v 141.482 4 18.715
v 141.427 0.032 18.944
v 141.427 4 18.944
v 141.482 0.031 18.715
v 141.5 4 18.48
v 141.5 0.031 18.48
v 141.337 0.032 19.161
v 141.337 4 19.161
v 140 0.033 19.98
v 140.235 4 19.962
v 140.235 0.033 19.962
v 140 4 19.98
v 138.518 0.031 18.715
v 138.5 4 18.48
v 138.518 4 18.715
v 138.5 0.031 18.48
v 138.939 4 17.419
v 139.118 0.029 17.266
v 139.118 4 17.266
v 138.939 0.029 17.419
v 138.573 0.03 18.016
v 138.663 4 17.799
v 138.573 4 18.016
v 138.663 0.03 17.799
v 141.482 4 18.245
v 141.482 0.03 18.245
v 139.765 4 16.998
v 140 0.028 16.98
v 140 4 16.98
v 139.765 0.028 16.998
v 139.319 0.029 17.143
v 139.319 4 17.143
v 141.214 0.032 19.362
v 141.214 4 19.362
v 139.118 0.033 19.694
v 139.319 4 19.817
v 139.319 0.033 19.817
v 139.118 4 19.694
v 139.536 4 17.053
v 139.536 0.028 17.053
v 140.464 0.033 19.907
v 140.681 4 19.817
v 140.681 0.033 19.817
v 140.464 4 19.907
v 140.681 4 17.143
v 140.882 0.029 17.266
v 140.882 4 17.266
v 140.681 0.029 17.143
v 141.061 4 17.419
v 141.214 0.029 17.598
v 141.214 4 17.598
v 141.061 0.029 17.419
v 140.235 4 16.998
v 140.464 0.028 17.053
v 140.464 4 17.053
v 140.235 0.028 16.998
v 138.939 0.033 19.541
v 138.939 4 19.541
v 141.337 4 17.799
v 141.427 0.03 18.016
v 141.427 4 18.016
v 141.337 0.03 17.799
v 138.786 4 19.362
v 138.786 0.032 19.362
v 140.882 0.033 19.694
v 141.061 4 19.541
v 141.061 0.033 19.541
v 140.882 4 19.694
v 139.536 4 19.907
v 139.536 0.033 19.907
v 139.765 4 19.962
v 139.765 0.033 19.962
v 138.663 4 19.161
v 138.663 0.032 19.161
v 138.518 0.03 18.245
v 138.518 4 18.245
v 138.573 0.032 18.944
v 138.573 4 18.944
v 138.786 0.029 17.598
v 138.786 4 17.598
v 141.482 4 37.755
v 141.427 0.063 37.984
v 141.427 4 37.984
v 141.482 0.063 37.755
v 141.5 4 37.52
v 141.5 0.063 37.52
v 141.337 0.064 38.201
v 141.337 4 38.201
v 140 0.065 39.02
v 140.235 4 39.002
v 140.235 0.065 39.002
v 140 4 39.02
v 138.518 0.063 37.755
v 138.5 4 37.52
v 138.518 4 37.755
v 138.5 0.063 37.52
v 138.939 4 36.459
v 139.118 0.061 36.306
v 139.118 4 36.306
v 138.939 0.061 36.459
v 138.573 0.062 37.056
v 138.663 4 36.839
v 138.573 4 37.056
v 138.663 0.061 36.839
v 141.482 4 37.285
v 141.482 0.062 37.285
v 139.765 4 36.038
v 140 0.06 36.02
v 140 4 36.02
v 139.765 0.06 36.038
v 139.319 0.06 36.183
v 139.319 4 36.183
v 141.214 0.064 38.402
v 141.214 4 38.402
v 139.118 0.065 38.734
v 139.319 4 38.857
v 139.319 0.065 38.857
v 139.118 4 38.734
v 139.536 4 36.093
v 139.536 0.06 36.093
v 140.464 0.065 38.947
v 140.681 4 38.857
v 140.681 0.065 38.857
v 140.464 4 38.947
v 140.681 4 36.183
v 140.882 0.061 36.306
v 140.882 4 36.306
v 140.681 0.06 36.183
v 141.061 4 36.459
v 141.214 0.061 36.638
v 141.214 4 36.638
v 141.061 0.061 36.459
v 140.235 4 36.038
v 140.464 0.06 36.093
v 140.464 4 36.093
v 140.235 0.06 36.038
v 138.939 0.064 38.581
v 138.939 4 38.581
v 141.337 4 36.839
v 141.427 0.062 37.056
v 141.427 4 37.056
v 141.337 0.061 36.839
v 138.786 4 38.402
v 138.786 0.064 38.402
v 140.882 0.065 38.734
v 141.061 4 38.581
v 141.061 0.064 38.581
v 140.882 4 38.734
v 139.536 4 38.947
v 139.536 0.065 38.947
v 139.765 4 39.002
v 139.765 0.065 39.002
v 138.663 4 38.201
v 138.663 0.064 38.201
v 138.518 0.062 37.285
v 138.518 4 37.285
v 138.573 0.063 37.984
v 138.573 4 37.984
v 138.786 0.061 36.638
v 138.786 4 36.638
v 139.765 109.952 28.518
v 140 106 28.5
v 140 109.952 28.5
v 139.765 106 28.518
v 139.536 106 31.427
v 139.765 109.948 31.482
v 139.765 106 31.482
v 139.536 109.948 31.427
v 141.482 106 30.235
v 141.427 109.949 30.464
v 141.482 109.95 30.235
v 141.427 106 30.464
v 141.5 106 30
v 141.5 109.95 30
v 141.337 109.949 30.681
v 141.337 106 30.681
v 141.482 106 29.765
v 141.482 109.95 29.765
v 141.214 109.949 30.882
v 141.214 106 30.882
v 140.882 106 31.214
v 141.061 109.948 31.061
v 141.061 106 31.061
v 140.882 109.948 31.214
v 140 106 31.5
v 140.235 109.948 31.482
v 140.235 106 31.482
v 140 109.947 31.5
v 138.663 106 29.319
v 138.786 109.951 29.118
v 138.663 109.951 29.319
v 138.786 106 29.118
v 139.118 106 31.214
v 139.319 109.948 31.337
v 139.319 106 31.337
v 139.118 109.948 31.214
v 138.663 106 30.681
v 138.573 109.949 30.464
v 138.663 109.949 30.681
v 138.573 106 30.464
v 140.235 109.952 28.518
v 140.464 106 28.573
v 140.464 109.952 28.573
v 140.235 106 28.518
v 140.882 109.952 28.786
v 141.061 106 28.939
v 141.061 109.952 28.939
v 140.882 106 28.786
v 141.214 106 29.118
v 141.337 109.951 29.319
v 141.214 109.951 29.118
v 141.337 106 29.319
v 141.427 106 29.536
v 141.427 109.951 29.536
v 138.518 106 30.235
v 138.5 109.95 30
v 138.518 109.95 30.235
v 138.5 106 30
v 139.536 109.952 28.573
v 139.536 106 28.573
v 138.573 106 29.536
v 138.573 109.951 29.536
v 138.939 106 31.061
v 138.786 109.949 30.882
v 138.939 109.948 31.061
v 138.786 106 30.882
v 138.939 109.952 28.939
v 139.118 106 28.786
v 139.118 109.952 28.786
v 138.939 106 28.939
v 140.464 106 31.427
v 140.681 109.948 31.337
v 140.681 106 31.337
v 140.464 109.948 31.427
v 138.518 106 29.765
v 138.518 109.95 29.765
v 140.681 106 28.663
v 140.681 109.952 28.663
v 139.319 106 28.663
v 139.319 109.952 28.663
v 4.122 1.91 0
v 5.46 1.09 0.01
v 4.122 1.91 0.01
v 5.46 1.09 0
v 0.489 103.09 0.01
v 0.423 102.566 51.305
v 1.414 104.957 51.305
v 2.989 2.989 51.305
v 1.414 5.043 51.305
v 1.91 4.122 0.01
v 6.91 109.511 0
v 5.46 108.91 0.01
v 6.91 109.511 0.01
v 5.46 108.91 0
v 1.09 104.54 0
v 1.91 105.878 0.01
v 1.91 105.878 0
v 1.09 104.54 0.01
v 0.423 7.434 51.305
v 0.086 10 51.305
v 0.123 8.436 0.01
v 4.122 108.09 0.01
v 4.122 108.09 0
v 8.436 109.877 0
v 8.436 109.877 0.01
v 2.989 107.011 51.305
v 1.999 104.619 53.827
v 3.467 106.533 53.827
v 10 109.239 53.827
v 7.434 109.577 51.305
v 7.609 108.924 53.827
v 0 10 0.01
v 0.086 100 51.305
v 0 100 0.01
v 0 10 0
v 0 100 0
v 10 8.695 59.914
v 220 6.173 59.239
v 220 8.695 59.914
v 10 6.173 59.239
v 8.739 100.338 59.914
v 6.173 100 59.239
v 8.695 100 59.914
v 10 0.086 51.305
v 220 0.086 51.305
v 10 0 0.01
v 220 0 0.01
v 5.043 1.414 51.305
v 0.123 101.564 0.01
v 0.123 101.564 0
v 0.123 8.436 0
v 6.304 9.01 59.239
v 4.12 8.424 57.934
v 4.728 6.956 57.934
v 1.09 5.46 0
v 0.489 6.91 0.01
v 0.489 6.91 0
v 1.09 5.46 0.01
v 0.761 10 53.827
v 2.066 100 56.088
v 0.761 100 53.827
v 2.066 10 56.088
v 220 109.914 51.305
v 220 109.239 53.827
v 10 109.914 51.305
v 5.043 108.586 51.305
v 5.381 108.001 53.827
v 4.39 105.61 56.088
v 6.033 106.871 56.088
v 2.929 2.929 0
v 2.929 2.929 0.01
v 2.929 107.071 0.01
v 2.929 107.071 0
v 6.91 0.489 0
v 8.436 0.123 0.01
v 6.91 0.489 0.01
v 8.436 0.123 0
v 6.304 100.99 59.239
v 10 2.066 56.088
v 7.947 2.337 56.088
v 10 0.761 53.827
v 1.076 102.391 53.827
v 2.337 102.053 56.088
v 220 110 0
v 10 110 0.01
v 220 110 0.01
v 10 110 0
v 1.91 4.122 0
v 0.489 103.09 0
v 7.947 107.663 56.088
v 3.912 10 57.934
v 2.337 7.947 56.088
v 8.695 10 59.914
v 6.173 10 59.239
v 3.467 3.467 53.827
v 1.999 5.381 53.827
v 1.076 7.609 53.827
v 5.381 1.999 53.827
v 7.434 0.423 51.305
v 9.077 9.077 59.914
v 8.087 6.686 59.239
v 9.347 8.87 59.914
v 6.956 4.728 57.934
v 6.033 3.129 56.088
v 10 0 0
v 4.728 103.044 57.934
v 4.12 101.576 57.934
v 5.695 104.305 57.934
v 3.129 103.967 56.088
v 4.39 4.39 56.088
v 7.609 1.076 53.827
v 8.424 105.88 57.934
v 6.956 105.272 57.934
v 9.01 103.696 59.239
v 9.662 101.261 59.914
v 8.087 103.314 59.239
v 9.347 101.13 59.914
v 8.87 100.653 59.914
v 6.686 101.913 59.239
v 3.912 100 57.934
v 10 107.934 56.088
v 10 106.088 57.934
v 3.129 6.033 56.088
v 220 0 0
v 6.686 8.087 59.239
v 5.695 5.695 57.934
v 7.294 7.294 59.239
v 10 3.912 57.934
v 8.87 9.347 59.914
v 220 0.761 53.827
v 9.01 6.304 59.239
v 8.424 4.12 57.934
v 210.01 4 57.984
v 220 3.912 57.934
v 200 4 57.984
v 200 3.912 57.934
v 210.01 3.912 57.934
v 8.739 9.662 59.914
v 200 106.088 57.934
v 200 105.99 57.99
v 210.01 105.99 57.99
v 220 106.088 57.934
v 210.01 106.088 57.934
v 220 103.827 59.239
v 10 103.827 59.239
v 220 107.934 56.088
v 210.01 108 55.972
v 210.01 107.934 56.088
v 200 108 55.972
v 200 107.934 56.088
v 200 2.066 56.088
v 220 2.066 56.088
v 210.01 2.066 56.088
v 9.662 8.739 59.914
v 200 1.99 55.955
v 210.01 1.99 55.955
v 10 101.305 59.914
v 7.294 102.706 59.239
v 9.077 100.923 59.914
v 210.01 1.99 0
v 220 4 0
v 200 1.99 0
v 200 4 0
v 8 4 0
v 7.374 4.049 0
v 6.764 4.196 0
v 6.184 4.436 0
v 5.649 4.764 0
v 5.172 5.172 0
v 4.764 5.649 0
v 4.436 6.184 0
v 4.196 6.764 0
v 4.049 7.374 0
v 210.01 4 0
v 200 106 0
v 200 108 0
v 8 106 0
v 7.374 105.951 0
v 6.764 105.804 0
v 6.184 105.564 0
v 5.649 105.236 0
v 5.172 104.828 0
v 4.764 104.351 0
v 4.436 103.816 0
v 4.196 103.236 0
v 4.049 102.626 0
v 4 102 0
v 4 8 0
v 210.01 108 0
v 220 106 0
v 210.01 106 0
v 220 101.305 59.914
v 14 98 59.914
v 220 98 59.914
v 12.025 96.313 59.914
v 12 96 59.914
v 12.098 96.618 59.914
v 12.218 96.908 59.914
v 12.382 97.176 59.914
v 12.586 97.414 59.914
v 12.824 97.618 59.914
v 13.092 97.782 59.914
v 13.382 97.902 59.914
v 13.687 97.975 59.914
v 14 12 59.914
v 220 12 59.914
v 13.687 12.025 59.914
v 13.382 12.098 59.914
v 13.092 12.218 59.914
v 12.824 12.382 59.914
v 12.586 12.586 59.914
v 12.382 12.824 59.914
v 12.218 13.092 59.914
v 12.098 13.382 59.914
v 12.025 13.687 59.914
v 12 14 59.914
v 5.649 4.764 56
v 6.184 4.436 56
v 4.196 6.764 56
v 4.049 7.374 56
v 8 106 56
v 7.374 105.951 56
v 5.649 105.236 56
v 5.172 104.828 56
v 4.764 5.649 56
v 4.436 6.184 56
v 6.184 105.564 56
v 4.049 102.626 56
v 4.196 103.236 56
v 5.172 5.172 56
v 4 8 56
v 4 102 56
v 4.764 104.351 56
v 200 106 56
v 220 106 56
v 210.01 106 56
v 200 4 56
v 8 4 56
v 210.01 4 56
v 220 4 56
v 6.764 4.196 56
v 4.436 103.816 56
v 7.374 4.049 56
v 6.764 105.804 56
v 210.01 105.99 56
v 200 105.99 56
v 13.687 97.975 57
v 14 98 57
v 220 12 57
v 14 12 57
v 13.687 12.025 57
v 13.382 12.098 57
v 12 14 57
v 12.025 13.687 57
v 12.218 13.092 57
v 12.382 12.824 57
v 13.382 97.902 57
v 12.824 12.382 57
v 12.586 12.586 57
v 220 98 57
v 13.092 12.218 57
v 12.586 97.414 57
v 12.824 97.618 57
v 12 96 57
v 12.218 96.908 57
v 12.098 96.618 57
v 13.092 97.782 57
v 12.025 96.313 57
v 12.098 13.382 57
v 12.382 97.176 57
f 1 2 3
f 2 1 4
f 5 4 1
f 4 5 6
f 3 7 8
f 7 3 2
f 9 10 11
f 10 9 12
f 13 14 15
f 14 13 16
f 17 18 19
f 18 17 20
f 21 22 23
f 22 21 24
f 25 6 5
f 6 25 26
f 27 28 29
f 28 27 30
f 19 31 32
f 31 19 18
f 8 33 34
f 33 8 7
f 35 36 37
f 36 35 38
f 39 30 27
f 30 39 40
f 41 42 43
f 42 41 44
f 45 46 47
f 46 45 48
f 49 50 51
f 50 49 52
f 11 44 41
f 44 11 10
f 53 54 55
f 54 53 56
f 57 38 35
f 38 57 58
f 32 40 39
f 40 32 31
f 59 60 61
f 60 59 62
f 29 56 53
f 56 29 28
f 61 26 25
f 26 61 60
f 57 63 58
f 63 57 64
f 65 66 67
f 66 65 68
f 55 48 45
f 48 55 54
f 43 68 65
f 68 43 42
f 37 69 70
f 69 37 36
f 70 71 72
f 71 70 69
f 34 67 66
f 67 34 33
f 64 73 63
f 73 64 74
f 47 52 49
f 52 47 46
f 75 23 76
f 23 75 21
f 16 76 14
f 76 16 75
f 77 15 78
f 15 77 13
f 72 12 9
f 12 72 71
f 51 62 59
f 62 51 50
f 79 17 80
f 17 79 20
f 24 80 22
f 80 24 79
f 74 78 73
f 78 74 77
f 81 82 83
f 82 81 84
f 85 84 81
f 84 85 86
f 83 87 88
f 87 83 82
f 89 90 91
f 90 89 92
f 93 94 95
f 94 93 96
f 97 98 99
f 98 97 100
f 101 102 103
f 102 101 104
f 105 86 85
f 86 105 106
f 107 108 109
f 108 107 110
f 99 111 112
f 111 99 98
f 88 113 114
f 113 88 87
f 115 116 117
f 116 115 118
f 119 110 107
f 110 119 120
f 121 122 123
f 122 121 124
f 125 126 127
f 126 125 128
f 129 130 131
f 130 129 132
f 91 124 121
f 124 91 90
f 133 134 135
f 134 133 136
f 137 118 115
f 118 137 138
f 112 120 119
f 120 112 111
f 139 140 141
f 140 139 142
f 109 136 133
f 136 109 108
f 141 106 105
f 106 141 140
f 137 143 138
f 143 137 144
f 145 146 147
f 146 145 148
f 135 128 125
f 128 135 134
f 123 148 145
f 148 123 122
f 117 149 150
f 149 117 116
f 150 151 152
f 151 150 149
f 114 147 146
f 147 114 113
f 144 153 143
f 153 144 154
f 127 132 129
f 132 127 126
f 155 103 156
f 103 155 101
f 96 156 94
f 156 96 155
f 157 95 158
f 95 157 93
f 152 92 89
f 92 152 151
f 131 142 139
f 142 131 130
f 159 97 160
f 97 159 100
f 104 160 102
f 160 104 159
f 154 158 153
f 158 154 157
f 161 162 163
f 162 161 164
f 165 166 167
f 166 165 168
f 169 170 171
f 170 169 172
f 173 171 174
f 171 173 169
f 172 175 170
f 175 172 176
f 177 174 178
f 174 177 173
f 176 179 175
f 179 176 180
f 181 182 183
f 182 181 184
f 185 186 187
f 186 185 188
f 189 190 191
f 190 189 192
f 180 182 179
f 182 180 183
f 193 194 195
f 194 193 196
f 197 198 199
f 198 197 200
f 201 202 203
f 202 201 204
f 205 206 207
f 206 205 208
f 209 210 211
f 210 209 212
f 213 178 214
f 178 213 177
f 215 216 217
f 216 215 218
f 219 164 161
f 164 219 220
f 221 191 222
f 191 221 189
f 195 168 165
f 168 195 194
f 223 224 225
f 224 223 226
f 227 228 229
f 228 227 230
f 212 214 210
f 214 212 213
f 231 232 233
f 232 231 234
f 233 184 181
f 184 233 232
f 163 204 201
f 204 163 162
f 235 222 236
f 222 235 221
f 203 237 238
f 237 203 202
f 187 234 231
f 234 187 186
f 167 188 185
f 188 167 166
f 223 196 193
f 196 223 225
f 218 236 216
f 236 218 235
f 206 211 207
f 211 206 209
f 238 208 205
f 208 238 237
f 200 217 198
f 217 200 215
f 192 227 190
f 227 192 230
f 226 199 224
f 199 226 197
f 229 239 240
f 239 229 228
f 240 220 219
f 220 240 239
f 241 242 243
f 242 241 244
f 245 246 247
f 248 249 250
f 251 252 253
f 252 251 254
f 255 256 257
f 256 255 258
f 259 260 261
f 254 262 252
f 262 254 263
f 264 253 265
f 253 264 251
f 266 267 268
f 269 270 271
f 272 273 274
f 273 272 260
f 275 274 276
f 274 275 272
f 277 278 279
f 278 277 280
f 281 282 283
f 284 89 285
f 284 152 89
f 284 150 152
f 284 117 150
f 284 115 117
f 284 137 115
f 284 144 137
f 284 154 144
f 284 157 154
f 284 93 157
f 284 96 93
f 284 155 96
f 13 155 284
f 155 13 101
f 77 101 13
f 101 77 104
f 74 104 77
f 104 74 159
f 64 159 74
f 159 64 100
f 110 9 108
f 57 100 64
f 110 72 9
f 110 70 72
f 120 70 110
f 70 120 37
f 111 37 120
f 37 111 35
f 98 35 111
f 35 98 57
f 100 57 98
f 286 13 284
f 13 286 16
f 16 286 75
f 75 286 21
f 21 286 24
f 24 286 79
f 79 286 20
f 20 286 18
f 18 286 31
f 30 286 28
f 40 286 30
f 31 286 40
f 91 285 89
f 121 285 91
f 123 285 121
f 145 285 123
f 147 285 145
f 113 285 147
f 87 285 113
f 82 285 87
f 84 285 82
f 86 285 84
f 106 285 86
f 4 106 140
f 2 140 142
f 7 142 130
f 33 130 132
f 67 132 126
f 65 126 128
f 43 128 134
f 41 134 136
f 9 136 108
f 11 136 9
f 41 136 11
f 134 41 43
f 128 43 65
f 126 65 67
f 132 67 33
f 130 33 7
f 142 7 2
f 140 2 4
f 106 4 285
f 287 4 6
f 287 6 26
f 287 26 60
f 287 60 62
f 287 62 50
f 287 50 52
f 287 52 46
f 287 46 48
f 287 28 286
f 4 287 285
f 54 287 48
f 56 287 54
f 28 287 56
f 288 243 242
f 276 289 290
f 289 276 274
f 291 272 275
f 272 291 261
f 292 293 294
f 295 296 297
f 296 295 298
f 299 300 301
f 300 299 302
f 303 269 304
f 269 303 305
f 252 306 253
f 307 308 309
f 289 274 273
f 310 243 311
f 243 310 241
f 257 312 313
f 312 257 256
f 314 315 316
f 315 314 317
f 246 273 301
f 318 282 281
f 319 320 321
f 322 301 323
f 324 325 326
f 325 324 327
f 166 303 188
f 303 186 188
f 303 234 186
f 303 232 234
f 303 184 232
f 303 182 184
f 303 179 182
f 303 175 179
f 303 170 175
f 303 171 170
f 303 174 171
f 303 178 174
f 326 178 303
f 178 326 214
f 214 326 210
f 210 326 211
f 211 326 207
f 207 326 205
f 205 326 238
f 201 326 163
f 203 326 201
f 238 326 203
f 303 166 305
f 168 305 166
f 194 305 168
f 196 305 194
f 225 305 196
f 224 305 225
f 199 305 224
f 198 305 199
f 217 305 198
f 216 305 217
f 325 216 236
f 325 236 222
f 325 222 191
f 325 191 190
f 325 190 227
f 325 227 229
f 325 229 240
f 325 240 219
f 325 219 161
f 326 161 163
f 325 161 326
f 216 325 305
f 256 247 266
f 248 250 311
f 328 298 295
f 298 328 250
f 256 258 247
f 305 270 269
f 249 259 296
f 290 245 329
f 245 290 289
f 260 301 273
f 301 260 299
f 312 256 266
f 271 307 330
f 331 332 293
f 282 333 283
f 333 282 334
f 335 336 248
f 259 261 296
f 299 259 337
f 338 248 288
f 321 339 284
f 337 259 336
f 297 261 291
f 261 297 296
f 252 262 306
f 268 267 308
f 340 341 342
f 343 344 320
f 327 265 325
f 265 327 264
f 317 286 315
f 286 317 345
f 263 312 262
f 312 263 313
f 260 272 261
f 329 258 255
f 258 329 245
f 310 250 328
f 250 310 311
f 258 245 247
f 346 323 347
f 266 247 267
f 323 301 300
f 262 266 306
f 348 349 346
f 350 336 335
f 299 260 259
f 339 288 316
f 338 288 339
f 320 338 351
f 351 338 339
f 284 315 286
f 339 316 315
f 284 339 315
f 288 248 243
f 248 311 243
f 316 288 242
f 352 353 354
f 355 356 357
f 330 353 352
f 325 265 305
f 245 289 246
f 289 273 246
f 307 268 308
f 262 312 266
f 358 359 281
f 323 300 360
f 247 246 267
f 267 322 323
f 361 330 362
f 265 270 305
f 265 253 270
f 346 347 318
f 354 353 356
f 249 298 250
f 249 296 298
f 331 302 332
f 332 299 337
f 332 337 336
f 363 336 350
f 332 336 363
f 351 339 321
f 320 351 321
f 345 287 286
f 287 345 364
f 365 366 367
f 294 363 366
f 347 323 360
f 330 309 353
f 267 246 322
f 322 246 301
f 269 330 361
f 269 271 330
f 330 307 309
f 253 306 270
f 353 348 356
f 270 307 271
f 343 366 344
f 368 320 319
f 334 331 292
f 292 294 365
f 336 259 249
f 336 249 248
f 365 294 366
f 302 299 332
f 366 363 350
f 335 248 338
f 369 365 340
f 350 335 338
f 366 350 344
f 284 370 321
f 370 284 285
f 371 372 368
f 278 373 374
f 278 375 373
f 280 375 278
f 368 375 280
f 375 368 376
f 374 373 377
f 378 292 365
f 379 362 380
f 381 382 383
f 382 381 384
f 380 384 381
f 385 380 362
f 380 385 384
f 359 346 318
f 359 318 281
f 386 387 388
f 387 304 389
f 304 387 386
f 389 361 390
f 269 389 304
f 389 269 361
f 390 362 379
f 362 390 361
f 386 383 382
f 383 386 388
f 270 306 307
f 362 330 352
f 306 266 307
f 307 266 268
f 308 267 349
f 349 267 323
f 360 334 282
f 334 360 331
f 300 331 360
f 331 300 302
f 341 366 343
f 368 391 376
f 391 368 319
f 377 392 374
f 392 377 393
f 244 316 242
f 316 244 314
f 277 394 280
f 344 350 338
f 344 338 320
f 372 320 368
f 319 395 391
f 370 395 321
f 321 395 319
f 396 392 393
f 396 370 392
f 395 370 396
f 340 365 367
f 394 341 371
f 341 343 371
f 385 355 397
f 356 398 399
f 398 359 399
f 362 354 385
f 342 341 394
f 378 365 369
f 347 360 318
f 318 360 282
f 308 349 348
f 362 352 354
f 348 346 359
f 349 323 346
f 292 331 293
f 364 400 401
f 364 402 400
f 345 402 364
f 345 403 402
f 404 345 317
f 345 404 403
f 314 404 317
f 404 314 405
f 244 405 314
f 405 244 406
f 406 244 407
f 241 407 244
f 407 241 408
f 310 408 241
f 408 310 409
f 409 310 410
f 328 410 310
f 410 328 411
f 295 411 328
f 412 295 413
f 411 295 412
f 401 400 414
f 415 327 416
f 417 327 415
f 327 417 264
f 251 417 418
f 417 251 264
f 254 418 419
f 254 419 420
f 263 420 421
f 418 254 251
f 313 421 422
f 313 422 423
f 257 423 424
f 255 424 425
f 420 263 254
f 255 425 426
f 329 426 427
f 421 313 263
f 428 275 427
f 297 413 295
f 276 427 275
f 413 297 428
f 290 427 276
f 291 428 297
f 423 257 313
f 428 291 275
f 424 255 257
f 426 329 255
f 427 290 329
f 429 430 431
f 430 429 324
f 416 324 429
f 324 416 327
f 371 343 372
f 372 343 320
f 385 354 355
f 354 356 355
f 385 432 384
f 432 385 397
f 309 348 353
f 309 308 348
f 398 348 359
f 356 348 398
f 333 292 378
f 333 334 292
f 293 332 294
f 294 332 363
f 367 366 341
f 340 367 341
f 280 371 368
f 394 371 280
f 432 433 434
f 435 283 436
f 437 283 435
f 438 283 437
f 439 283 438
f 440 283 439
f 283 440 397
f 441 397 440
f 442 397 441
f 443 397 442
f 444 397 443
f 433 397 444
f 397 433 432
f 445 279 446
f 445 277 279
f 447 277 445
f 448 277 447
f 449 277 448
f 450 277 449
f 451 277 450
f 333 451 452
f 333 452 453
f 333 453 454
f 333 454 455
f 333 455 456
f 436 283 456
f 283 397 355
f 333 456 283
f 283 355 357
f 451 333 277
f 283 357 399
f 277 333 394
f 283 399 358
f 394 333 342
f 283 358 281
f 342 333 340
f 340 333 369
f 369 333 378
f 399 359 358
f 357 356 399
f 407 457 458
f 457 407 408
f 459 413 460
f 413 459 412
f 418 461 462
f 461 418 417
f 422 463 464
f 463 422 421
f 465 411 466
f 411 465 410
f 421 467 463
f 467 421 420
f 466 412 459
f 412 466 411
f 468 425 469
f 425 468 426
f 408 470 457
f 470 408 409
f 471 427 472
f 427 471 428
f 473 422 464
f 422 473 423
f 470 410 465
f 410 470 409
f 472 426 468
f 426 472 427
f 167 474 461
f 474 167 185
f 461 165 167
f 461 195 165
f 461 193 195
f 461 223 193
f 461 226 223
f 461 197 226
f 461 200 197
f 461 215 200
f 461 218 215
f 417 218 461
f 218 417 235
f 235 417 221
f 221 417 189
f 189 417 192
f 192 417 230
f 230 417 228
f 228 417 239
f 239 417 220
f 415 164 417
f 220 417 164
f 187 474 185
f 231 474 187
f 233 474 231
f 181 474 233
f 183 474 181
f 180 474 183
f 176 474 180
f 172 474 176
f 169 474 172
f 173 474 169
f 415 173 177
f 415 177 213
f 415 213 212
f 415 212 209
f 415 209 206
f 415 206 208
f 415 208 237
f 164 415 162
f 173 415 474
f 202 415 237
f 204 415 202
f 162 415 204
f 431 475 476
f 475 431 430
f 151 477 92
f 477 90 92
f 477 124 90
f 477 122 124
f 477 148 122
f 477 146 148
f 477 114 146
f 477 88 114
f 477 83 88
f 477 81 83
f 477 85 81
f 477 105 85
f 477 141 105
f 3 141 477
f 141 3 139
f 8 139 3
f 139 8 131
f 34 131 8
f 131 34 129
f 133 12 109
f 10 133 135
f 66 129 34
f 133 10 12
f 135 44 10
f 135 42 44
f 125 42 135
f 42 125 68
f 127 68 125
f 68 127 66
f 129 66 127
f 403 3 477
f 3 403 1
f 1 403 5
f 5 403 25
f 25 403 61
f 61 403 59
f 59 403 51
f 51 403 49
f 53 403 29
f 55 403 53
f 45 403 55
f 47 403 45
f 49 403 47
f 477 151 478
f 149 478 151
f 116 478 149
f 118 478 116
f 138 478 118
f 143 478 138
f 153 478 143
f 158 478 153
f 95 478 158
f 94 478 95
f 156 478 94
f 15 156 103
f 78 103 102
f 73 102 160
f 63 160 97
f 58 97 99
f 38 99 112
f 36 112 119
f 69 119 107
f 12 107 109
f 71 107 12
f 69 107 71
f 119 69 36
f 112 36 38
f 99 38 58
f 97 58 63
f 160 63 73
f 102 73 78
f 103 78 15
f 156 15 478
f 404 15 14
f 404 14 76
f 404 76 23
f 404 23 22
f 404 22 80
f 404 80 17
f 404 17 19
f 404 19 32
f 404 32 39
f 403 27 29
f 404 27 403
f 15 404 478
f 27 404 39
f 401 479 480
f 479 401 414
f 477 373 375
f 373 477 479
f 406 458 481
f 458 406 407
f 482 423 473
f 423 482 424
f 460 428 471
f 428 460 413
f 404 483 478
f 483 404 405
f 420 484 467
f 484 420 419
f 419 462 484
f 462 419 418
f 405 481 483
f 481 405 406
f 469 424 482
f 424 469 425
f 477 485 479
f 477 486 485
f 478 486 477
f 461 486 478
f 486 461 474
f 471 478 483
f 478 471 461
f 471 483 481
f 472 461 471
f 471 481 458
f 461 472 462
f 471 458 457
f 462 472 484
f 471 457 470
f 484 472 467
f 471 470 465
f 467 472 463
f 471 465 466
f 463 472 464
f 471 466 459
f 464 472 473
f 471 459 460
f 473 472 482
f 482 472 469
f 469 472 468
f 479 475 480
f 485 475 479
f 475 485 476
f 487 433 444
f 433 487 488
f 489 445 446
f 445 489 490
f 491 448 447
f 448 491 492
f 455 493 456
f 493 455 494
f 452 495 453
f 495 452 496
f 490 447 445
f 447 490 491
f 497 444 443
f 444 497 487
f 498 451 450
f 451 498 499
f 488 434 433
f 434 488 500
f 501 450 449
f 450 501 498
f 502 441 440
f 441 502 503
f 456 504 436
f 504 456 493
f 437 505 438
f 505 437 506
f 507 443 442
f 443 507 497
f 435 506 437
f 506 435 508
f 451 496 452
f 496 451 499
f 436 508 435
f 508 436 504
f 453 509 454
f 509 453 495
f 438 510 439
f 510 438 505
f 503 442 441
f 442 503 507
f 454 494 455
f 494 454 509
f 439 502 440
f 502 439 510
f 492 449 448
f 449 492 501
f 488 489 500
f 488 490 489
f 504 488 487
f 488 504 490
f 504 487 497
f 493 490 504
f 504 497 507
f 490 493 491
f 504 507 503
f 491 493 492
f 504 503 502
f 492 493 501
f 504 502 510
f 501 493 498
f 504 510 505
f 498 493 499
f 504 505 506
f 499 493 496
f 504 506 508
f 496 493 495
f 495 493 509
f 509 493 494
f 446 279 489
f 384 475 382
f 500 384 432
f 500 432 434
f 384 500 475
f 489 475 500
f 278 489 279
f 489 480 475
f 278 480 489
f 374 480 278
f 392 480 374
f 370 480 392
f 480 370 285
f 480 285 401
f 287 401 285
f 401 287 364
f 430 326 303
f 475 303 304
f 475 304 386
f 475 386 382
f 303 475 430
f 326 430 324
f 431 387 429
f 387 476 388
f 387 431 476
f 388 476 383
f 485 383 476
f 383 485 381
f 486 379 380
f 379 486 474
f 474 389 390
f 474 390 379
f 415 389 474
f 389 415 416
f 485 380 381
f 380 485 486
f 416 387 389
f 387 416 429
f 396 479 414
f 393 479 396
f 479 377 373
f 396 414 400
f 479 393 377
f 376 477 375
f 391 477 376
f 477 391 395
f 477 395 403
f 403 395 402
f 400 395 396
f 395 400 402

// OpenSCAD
include <protective_storage_box.scad>
lid_angle = 0;
show_tray_in_assembly = false;
render_assembly = false;
rotate([180, 0, 0]) translate([0, -width, -lid_h]) box_lid_left();
